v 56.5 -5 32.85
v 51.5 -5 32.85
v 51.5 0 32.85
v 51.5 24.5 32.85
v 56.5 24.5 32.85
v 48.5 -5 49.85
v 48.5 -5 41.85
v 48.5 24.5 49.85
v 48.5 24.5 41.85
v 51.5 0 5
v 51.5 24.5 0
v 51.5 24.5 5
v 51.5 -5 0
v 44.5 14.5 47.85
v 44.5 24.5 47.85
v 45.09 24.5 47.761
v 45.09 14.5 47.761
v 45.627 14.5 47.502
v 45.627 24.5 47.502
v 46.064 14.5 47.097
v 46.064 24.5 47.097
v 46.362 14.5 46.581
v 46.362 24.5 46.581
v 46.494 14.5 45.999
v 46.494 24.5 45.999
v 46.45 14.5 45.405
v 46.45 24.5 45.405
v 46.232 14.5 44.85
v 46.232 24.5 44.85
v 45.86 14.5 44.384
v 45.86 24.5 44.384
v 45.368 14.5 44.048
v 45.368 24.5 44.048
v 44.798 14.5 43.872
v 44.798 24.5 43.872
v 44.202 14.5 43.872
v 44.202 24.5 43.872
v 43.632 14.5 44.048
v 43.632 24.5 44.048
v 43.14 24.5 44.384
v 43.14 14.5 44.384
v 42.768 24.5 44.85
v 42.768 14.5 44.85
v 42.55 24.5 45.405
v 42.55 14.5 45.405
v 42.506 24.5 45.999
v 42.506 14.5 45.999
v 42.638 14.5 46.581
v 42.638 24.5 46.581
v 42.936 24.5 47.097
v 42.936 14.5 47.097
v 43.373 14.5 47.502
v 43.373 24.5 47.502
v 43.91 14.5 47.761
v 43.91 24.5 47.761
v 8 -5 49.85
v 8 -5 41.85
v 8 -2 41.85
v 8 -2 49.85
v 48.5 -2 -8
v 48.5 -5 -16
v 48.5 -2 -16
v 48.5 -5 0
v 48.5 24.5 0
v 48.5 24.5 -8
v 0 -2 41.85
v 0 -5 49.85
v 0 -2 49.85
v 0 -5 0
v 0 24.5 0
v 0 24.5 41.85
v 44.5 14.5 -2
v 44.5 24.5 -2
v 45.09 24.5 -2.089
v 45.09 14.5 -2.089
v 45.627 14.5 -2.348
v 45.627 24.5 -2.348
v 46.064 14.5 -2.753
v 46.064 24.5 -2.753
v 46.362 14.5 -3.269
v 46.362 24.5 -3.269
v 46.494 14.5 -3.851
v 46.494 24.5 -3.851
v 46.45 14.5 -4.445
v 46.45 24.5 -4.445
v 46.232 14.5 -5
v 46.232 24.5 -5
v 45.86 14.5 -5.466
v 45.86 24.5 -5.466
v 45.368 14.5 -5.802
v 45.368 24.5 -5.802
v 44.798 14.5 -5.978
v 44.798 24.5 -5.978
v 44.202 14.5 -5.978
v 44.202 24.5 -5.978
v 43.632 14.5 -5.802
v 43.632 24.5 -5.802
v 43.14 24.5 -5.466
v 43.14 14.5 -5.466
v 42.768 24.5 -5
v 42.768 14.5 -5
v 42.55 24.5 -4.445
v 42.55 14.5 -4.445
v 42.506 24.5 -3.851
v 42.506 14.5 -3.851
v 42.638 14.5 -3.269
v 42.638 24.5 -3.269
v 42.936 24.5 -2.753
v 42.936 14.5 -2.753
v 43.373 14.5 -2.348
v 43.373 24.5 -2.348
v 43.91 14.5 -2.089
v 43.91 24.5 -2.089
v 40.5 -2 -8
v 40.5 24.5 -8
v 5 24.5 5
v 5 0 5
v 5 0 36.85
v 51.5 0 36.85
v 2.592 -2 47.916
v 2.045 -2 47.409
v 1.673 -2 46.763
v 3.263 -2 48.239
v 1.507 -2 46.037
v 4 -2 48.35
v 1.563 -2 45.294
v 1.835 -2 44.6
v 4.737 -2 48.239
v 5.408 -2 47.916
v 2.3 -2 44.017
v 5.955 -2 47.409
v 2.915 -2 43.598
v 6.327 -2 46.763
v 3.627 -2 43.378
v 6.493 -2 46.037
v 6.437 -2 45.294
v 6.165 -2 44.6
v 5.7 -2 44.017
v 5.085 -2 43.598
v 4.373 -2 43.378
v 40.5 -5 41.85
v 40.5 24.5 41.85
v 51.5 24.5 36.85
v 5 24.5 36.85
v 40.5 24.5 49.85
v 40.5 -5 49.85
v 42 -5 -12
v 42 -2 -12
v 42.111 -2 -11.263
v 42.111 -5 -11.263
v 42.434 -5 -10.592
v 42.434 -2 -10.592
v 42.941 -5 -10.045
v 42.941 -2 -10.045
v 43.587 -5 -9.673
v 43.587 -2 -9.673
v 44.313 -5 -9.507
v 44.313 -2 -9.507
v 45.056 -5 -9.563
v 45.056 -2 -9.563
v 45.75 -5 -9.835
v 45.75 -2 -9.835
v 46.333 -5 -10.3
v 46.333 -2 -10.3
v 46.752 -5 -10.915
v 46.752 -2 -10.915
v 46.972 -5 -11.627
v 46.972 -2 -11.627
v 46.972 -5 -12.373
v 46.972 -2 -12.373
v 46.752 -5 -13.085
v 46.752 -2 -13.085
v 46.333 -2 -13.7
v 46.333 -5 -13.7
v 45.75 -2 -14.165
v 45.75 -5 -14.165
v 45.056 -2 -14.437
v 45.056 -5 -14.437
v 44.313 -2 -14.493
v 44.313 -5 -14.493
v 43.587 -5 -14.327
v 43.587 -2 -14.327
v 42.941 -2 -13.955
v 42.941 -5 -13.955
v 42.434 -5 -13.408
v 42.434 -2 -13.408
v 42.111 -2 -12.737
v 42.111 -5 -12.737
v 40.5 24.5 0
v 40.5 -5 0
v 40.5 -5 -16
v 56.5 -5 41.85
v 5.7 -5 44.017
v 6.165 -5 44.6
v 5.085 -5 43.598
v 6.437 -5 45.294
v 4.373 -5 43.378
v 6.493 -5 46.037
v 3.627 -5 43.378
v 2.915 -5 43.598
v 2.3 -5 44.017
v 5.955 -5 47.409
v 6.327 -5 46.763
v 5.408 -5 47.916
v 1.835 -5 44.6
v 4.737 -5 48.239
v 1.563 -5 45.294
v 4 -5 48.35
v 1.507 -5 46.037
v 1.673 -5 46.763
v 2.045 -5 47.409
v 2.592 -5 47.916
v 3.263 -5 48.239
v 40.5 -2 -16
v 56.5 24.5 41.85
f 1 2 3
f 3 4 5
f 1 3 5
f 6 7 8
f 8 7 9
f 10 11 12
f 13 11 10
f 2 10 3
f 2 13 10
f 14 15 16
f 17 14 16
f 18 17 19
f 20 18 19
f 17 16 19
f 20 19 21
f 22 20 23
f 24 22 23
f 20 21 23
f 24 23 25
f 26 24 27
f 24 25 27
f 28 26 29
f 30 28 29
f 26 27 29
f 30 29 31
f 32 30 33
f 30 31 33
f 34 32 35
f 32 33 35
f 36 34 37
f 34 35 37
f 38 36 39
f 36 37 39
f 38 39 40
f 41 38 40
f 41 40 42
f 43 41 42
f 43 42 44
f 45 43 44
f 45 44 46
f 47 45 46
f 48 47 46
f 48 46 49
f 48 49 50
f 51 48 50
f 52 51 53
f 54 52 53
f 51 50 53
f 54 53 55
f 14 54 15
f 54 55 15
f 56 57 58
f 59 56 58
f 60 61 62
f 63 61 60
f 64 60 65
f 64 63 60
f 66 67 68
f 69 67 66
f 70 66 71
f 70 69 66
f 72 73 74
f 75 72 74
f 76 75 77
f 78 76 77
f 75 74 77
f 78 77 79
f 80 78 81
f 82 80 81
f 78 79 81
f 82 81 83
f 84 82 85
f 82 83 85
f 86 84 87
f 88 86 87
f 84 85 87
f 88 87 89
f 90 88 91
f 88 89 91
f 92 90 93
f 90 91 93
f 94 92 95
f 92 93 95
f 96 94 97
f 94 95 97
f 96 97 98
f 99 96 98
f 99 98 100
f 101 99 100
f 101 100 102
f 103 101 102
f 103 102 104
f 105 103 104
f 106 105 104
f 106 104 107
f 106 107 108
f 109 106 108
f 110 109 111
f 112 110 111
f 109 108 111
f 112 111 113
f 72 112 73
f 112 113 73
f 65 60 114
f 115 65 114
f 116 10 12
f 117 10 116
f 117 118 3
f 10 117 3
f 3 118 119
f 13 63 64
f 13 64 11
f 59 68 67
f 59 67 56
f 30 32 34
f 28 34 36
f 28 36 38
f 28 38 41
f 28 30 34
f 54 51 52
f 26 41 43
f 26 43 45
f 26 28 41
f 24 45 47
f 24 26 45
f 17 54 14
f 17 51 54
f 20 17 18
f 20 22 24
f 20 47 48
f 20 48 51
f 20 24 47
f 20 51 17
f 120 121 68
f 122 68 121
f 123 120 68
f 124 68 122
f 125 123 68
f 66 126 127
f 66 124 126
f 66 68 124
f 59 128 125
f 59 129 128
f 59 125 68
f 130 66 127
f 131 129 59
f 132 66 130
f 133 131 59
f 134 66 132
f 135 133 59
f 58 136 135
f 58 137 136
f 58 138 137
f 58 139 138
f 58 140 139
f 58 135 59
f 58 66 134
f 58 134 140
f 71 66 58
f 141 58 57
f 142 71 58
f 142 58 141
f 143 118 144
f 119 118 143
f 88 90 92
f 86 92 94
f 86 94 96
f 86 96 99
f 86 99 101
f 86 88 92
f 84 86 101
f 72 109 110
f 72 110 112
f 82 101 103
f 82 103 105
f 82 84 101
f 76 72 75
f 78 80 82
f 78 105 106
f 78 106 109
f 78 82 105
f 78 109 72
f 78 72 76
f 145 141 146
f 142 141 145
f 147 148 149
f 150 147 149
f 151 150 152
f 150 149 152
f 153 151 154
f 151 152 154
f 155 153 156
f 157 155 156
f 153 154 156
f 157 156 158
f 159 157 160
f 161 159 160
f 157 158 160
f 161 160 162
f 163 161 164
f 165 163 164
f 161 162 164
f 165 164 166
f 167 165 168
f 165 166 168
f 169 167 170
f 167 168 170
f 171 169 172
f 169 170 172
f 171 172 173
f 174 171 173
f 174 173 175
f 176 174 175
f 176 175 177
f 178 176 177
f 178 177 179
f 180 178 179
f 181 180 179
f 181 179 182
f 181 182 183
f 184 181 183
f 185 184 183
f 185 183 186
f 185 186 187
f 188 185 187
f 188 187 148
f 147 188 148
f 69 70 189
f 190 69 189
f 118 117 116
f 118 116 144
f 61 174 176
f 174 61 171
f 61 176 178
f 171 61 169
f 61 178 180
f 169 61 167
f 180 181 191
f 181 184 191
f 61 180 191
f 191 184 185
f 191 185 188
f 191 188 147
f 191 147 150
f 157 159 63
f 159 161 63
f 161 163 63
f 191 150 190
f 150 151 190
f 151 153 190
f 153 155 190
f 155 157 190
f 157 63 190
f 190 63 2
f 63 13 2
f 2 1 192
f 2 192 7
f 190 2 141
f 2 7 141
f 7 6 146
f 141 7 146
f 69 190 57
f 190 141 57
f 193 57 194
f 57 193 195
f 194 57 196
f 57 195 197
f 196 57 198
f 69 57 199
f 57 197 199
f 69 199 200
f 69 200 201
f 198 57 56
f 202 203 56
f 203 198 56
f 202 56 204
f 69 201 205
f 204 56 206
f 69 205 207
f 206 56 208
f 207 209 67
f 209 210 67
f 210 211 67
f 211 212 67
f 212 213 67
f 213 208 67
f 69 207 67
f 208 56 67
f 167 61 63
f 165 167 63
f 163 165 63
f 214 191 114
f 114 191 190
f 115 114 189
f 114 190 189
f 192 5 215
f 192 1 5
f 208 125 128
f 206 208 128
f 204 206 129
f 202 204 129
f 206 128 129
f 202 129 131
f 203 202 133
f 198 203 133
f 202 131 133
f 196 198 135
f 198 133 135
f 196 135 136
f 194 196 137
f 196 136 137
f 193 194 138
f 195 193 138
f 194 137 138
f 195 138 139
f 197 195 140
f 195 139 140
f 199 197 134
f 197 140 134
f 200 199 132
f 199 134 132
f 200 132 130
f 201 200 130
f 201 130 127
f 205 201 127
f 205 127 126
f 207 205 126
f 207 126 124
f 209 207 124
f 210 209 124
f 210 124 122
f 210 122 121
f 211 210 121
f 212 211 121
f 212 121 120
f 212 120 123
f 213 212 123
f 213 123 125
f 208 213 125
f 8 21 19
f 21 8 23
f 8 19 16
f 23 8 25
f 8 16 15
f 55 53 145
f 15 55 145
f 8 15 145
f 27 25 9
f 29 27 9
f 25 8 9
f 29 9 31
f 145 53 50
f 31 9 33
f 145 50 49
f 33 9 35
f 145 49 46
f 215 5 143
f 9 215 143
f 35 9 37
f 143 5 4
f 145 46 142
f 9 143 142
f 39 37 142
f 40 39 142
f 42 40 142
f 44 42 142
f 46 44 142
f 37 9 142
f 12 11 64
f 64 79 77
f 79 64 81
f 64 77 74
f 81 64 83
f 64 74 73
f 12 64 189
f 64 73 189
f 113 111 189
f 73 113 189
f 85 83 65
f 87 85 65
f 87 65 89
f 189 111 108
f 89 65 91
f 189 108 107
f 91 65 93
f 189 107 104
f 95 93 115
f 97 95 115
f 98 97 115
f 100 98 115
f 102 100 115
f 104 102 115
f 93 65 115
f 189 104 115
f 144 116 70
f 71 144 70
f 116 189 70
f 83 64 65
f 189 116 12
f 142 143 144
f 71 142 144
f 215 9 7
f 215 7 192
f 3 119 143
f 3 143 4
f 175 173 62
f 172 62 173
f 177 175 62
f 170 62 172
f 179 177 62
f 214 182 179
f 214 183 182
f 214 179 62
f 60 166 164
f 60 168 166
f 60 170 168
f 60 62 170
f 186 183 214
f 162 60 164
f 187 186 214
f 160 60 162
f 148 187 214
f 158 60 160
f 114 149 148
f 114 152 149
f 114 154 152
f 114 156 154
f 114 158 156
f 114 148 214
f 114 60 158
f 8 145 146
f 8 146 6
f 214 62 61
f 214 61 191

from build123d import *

# Parameters (mm, degrees)
BOSS_EXTRUDE1_DEPTH = 24.5
SKETCH2_W           = 103
SKETCH2_H           = 41.85
BOSS_EXTRUDE2_DEPTH = 5
SKETCH3_W           = 46.5
SKETCH3_H           = 27.85
CUT_EXTRUDE1_DEPTH  = 26
SKETCH7_W           = 8
SKETCH7_H           = 3
BOSS_EXTRUDE3_DEPTH = 8
SKETCH8_R           = 2.5
CUT_EXTRUDE2_DEPTH  = 8
SKETCH9_W           = 8
SKETCH9_H           = 3
BOSS_EXTRUDE4_DEPTH = 8
SKETCH10_R          = 2.5
CUT_EXTRUDE3_DEPTH  = 8
SKETCH12_W          = 11.5
SKETCH12_H          = 5
CUT_EXTRUDE4_DEPTH  = 8
SKETCH14_W          = 8
SKETCH14_H          = 3
BOSS_EXTRUDE5_DEPTH = 8
SKETCH15_R          = 2.5
CUT_EXTRUDE5_DEPTH  = 8
SKETCH16_W          = 8
SKETCH16_H          = 29.5
BOSS_EXTRUDE6_DEPTH = 8
SKETCH17_W          = 8
SKETCH17_H          = 29.5
BOSS_EXTRUDE7_DEPTH = 8
SKETCH18_R          = 2
CUT_EXTRUDE6_DEPTH  = 10
SKETCH20_W          = 8
SKETCH20_H          = 3
BOSS_EXTRUDE8_DEPTH = 8
SKETCH21_R          = 2.5
CUT_EXTRUDE7_DEPTH  = 8
SKETCH22_W          = 5
SKETCH22_H          = 5
CUT_EXTRUDE8_DEPTH  = 8
SKETCH23_W          = 27
SKETCH23_H          = 5
CUT_EXTRUDE9_DEPTH  = 8


with BuildPart() as part:
    # Sketch1 → Boss-Extrude1 (new body)
    with BuildSketch(Plane(origin=(0, 0, 0), x_dir=(1, 0, 0), z_dir=(0, 1, 0))):
        Polygon((0, 0), (51.5, 0), (51.5, -5), (5, -5), (5, -36.85), (51.5, -36.85), (51.5, -32.85), (56.5, -32.85), (56.5, -41.85), (0, -41.85), align=None)
    extrude(amount=BOSS_EXTRUDE1_DEPTH)

    # Sketch2 → Boss-Extrude2 (add)
    with BuildSketch(Plane.XZ):
        with Locations((51.5, 20.925)):
            Rectangle(SKETCH2_W, SKETCH2_H)
    extrude(amount=BOSS_EXTRUDE2_DEPTH)

    # Sketch3 → Cut-Extrude1 (cut)
    with BuildSketch(Plane(origin=(0, 0, 0), x_dir=(1, 0, 0), z_dir=(0, 1, 0))):
        with Locations((74.75, -18.925)):
            Rectangle(SKETCH3_W, SKETCH3_H)
    extrude(amount=-CUT_EXTRUDE1_DEPTH, mode=Mode.SUBTRACT)

    # Sketch7 → Boss-Extrude3 (add)
    with BuildSketch(Plane.XY.offset(41.85)):
        with Locations((4, -3.5)):
            Rectangle(SKETCH7_W, SKETCH7_H)
    extrude(amount=BOSS_EXTRUDE3_DEPTH)

    # Sketch8 → Cut-Extrude2 (cut)
    with BuildSketch(Plane(origin=(0, -2, 0), x_dir=(1, 0, 0), z_dir=(0, 1, 0))):
        with Locations(Location((4, -45.85, 0), (0, 0, 270))):
            Circle(SKETCH8_R)
    extrude(amount=-CUT_EXTRUDE2_DEPTH, mode=Mode.SUBTRACT)

    # Sketch9 → Boss-Extrude4 (add)
    with BuildSketch(Plane(origin=(0, 0, 0), x_dir=(-1, 0, 0), z_dir=(0, 0, -1))):
        with Locations((-99, -3.5)):
            Rectangle(SKETCH9_W, SKETCH9_H)
    extrude(amount=BOSS_EXTRUDE4_DEPTH)

    # Sketch10 → Cut-Extrude3 (cut)
    with BuildSketch(Plane(origin=(0, -2, 0), x_dir=(1, 0, 0), z_dir=(0, 1, 0))):
        with Locations(Location((99, 3.996680608, 0), (0, 0, 270))):
            Circle(SKETCH10_R)
    extrude(amount=-CUT_EXTRUDE3_DEPTH, mode=Mode.SUBTRACT)

    # Sketch12 → Cut-Extrude4 (cut)
    with BuildSketch(Plane(origin=(0, 0, 0), x_dir=(1, 0, 0), z_dir=(0, 1, 0))):
        with Locations((89.25, -2.5)):
            Rectangle(SKETCH12_W, SKETCH12_H)
    extrude(amount=-CUT_EXTRUDE4_DEPTH, mode=Mode.SUBTRACT)

    # Sketch14 → Boss-Extrude5 (add)
    with BuildSketch(Plane(origin=(0, 0, 0), x_dir=(-1, 0, 0), z_dir=(0, 0, -1))):
        with Locations((-79.5, -3.5)):
            Rectangle(SKETCH14_W, SKETCH14_H)
    extrude(amount=BOSS_EXTRUDE5_DEPTH)

    # Sketch15 → Cut-Extrude5 (cut)
    with BuildSketch(Plane(origin=(0, -2, 0), x_dir=(1, 0, 0), z_dir=(0, 1, 0))):
        with Locations(Location((79.5, 4, 0), (0, 0, 270))):
            Circle(SKETCH15_R)
    extrude(amount=-CUT_EXTRUDE5_DEPTH, mode=Mode.SUBTRACT)

    # Sketch16 → Boss-Extrude6 (add)
    with BuildSketch(Plane(origin=(0, 0, 0), x_dir=(-1, 0, 0), z_dir=(0, 0, -1))):
        with Locations((-44.5, 9.75)):
            Rectangle(SKETCH16_W, SKETCH16_H)
    extrude(amount=BOSS_EXTRUDE6_DEPTH)

    # Sketch17 → Boss-Extrude7 (add)
    with BuildSketch(Plane.XY.offset(41.85)):
        with Locations((44.5, 9.75)):
            Rectangle(SKETCH17_W, SKETCH17_H)
    extrude(amount=BOSS_EXTRUDE7_DEPTH)

    # Sketch18 → Cut-Extrude6 (cut)
    with BuildSketch(Plane(origin=(0, 24.5, 0), x_dir=(1, 0, 0), z_dir=(0, 1, 0))):
        with Locations(Location((44.5, 4, 0), (0, 0, 270))):
            Circle(SKETCH18_R)
        with Locations(Location((44.5, -45.85, 0), (0, 0, 270))):
            Circle(SKETCH18_R)
    extrude(amount=-CUT_EXTRUDE6_DEPTH, mode=Mode.SUBTRACT)

    # Sketch20 → Boss-Extrude8 (add)
    with BuildSketch(Plane(origin=(0, 0, -8), x_dir=(-1, 0, 0), z_dir=(0, 0, -1))):
        with Locations((-44.5, -3.5)):
            Rectangle(SKETCH20_W, SKETCH20_H)
    extrude(amount=BOSS_EXTRUDE8_DEPTH)

    # Sketch21 → Cut-Extrude7 (cut)
    with BuildSketch(Plane(origin=(0, -2, 0), x_dir=(1, 0, 0), z_dir=(0, 1, 0))):
        with Locations(Location((44.5, 12, 0), (0, 0, 180))):
            Circle(SKETCH21_R)
    extrude(amount=-CUT_EXTRUDE7_DEPTH, mode=Mode.SUBTRACT)

    # Sketch22 → Cut-Extrude8 (cut)
    with BuildSketch(Plane(origin=(0, 0, 0), x_dir=(1, 0, 0), z_dir=(0, 1, 0))):
        Polygon((103, -41.85), (103, 8), (56.5, 8), (56.5, 0), (83.5, 0), (83.5, -5), (56.5, -5), (56.5, -41.85), align=None)
        with Locations((54, -2.5)):
            Rectangle(SKETCH22_W, SKETCH22_H)
    extrude(amount=-CUT_EXTRUDE8_DEPTH, mode=Mode.SUBTRACT)


with BuildPart() as cut_extrude8_piece_1:
    # of the separate pieces the step leaves, piece 1, a body of its own (cut_extrude8_pieces)
    add(part.part.solids().sort_by_distance((51.5, 24.5, 0))[0])


with BuildPart() as cut_extrude8_piece_2:
    # of the separate pieces the step leaves, piece 2, a body of its own (cut_extrude8_pieces)
    add(part.part.solids().sort_by_distance((83.5, 0, 0))[0])

    # Sketch23 → Cut-Extrude9 (cut)
    with BuildSketch(Plane(origin=(0, 0, 0), x_dir=(1, 0, 0), z_dir=(0, 1, 0))):
        with Locations((70, -2.5)):
            Rectangle(SKETCH23_W, SKETCH23_H)
    extrude(amount=-CUT_EXTRUDE9_DEPTH, mode=Mode.SUBTRACT)


solid = cut_extrude8_piece_1.part
